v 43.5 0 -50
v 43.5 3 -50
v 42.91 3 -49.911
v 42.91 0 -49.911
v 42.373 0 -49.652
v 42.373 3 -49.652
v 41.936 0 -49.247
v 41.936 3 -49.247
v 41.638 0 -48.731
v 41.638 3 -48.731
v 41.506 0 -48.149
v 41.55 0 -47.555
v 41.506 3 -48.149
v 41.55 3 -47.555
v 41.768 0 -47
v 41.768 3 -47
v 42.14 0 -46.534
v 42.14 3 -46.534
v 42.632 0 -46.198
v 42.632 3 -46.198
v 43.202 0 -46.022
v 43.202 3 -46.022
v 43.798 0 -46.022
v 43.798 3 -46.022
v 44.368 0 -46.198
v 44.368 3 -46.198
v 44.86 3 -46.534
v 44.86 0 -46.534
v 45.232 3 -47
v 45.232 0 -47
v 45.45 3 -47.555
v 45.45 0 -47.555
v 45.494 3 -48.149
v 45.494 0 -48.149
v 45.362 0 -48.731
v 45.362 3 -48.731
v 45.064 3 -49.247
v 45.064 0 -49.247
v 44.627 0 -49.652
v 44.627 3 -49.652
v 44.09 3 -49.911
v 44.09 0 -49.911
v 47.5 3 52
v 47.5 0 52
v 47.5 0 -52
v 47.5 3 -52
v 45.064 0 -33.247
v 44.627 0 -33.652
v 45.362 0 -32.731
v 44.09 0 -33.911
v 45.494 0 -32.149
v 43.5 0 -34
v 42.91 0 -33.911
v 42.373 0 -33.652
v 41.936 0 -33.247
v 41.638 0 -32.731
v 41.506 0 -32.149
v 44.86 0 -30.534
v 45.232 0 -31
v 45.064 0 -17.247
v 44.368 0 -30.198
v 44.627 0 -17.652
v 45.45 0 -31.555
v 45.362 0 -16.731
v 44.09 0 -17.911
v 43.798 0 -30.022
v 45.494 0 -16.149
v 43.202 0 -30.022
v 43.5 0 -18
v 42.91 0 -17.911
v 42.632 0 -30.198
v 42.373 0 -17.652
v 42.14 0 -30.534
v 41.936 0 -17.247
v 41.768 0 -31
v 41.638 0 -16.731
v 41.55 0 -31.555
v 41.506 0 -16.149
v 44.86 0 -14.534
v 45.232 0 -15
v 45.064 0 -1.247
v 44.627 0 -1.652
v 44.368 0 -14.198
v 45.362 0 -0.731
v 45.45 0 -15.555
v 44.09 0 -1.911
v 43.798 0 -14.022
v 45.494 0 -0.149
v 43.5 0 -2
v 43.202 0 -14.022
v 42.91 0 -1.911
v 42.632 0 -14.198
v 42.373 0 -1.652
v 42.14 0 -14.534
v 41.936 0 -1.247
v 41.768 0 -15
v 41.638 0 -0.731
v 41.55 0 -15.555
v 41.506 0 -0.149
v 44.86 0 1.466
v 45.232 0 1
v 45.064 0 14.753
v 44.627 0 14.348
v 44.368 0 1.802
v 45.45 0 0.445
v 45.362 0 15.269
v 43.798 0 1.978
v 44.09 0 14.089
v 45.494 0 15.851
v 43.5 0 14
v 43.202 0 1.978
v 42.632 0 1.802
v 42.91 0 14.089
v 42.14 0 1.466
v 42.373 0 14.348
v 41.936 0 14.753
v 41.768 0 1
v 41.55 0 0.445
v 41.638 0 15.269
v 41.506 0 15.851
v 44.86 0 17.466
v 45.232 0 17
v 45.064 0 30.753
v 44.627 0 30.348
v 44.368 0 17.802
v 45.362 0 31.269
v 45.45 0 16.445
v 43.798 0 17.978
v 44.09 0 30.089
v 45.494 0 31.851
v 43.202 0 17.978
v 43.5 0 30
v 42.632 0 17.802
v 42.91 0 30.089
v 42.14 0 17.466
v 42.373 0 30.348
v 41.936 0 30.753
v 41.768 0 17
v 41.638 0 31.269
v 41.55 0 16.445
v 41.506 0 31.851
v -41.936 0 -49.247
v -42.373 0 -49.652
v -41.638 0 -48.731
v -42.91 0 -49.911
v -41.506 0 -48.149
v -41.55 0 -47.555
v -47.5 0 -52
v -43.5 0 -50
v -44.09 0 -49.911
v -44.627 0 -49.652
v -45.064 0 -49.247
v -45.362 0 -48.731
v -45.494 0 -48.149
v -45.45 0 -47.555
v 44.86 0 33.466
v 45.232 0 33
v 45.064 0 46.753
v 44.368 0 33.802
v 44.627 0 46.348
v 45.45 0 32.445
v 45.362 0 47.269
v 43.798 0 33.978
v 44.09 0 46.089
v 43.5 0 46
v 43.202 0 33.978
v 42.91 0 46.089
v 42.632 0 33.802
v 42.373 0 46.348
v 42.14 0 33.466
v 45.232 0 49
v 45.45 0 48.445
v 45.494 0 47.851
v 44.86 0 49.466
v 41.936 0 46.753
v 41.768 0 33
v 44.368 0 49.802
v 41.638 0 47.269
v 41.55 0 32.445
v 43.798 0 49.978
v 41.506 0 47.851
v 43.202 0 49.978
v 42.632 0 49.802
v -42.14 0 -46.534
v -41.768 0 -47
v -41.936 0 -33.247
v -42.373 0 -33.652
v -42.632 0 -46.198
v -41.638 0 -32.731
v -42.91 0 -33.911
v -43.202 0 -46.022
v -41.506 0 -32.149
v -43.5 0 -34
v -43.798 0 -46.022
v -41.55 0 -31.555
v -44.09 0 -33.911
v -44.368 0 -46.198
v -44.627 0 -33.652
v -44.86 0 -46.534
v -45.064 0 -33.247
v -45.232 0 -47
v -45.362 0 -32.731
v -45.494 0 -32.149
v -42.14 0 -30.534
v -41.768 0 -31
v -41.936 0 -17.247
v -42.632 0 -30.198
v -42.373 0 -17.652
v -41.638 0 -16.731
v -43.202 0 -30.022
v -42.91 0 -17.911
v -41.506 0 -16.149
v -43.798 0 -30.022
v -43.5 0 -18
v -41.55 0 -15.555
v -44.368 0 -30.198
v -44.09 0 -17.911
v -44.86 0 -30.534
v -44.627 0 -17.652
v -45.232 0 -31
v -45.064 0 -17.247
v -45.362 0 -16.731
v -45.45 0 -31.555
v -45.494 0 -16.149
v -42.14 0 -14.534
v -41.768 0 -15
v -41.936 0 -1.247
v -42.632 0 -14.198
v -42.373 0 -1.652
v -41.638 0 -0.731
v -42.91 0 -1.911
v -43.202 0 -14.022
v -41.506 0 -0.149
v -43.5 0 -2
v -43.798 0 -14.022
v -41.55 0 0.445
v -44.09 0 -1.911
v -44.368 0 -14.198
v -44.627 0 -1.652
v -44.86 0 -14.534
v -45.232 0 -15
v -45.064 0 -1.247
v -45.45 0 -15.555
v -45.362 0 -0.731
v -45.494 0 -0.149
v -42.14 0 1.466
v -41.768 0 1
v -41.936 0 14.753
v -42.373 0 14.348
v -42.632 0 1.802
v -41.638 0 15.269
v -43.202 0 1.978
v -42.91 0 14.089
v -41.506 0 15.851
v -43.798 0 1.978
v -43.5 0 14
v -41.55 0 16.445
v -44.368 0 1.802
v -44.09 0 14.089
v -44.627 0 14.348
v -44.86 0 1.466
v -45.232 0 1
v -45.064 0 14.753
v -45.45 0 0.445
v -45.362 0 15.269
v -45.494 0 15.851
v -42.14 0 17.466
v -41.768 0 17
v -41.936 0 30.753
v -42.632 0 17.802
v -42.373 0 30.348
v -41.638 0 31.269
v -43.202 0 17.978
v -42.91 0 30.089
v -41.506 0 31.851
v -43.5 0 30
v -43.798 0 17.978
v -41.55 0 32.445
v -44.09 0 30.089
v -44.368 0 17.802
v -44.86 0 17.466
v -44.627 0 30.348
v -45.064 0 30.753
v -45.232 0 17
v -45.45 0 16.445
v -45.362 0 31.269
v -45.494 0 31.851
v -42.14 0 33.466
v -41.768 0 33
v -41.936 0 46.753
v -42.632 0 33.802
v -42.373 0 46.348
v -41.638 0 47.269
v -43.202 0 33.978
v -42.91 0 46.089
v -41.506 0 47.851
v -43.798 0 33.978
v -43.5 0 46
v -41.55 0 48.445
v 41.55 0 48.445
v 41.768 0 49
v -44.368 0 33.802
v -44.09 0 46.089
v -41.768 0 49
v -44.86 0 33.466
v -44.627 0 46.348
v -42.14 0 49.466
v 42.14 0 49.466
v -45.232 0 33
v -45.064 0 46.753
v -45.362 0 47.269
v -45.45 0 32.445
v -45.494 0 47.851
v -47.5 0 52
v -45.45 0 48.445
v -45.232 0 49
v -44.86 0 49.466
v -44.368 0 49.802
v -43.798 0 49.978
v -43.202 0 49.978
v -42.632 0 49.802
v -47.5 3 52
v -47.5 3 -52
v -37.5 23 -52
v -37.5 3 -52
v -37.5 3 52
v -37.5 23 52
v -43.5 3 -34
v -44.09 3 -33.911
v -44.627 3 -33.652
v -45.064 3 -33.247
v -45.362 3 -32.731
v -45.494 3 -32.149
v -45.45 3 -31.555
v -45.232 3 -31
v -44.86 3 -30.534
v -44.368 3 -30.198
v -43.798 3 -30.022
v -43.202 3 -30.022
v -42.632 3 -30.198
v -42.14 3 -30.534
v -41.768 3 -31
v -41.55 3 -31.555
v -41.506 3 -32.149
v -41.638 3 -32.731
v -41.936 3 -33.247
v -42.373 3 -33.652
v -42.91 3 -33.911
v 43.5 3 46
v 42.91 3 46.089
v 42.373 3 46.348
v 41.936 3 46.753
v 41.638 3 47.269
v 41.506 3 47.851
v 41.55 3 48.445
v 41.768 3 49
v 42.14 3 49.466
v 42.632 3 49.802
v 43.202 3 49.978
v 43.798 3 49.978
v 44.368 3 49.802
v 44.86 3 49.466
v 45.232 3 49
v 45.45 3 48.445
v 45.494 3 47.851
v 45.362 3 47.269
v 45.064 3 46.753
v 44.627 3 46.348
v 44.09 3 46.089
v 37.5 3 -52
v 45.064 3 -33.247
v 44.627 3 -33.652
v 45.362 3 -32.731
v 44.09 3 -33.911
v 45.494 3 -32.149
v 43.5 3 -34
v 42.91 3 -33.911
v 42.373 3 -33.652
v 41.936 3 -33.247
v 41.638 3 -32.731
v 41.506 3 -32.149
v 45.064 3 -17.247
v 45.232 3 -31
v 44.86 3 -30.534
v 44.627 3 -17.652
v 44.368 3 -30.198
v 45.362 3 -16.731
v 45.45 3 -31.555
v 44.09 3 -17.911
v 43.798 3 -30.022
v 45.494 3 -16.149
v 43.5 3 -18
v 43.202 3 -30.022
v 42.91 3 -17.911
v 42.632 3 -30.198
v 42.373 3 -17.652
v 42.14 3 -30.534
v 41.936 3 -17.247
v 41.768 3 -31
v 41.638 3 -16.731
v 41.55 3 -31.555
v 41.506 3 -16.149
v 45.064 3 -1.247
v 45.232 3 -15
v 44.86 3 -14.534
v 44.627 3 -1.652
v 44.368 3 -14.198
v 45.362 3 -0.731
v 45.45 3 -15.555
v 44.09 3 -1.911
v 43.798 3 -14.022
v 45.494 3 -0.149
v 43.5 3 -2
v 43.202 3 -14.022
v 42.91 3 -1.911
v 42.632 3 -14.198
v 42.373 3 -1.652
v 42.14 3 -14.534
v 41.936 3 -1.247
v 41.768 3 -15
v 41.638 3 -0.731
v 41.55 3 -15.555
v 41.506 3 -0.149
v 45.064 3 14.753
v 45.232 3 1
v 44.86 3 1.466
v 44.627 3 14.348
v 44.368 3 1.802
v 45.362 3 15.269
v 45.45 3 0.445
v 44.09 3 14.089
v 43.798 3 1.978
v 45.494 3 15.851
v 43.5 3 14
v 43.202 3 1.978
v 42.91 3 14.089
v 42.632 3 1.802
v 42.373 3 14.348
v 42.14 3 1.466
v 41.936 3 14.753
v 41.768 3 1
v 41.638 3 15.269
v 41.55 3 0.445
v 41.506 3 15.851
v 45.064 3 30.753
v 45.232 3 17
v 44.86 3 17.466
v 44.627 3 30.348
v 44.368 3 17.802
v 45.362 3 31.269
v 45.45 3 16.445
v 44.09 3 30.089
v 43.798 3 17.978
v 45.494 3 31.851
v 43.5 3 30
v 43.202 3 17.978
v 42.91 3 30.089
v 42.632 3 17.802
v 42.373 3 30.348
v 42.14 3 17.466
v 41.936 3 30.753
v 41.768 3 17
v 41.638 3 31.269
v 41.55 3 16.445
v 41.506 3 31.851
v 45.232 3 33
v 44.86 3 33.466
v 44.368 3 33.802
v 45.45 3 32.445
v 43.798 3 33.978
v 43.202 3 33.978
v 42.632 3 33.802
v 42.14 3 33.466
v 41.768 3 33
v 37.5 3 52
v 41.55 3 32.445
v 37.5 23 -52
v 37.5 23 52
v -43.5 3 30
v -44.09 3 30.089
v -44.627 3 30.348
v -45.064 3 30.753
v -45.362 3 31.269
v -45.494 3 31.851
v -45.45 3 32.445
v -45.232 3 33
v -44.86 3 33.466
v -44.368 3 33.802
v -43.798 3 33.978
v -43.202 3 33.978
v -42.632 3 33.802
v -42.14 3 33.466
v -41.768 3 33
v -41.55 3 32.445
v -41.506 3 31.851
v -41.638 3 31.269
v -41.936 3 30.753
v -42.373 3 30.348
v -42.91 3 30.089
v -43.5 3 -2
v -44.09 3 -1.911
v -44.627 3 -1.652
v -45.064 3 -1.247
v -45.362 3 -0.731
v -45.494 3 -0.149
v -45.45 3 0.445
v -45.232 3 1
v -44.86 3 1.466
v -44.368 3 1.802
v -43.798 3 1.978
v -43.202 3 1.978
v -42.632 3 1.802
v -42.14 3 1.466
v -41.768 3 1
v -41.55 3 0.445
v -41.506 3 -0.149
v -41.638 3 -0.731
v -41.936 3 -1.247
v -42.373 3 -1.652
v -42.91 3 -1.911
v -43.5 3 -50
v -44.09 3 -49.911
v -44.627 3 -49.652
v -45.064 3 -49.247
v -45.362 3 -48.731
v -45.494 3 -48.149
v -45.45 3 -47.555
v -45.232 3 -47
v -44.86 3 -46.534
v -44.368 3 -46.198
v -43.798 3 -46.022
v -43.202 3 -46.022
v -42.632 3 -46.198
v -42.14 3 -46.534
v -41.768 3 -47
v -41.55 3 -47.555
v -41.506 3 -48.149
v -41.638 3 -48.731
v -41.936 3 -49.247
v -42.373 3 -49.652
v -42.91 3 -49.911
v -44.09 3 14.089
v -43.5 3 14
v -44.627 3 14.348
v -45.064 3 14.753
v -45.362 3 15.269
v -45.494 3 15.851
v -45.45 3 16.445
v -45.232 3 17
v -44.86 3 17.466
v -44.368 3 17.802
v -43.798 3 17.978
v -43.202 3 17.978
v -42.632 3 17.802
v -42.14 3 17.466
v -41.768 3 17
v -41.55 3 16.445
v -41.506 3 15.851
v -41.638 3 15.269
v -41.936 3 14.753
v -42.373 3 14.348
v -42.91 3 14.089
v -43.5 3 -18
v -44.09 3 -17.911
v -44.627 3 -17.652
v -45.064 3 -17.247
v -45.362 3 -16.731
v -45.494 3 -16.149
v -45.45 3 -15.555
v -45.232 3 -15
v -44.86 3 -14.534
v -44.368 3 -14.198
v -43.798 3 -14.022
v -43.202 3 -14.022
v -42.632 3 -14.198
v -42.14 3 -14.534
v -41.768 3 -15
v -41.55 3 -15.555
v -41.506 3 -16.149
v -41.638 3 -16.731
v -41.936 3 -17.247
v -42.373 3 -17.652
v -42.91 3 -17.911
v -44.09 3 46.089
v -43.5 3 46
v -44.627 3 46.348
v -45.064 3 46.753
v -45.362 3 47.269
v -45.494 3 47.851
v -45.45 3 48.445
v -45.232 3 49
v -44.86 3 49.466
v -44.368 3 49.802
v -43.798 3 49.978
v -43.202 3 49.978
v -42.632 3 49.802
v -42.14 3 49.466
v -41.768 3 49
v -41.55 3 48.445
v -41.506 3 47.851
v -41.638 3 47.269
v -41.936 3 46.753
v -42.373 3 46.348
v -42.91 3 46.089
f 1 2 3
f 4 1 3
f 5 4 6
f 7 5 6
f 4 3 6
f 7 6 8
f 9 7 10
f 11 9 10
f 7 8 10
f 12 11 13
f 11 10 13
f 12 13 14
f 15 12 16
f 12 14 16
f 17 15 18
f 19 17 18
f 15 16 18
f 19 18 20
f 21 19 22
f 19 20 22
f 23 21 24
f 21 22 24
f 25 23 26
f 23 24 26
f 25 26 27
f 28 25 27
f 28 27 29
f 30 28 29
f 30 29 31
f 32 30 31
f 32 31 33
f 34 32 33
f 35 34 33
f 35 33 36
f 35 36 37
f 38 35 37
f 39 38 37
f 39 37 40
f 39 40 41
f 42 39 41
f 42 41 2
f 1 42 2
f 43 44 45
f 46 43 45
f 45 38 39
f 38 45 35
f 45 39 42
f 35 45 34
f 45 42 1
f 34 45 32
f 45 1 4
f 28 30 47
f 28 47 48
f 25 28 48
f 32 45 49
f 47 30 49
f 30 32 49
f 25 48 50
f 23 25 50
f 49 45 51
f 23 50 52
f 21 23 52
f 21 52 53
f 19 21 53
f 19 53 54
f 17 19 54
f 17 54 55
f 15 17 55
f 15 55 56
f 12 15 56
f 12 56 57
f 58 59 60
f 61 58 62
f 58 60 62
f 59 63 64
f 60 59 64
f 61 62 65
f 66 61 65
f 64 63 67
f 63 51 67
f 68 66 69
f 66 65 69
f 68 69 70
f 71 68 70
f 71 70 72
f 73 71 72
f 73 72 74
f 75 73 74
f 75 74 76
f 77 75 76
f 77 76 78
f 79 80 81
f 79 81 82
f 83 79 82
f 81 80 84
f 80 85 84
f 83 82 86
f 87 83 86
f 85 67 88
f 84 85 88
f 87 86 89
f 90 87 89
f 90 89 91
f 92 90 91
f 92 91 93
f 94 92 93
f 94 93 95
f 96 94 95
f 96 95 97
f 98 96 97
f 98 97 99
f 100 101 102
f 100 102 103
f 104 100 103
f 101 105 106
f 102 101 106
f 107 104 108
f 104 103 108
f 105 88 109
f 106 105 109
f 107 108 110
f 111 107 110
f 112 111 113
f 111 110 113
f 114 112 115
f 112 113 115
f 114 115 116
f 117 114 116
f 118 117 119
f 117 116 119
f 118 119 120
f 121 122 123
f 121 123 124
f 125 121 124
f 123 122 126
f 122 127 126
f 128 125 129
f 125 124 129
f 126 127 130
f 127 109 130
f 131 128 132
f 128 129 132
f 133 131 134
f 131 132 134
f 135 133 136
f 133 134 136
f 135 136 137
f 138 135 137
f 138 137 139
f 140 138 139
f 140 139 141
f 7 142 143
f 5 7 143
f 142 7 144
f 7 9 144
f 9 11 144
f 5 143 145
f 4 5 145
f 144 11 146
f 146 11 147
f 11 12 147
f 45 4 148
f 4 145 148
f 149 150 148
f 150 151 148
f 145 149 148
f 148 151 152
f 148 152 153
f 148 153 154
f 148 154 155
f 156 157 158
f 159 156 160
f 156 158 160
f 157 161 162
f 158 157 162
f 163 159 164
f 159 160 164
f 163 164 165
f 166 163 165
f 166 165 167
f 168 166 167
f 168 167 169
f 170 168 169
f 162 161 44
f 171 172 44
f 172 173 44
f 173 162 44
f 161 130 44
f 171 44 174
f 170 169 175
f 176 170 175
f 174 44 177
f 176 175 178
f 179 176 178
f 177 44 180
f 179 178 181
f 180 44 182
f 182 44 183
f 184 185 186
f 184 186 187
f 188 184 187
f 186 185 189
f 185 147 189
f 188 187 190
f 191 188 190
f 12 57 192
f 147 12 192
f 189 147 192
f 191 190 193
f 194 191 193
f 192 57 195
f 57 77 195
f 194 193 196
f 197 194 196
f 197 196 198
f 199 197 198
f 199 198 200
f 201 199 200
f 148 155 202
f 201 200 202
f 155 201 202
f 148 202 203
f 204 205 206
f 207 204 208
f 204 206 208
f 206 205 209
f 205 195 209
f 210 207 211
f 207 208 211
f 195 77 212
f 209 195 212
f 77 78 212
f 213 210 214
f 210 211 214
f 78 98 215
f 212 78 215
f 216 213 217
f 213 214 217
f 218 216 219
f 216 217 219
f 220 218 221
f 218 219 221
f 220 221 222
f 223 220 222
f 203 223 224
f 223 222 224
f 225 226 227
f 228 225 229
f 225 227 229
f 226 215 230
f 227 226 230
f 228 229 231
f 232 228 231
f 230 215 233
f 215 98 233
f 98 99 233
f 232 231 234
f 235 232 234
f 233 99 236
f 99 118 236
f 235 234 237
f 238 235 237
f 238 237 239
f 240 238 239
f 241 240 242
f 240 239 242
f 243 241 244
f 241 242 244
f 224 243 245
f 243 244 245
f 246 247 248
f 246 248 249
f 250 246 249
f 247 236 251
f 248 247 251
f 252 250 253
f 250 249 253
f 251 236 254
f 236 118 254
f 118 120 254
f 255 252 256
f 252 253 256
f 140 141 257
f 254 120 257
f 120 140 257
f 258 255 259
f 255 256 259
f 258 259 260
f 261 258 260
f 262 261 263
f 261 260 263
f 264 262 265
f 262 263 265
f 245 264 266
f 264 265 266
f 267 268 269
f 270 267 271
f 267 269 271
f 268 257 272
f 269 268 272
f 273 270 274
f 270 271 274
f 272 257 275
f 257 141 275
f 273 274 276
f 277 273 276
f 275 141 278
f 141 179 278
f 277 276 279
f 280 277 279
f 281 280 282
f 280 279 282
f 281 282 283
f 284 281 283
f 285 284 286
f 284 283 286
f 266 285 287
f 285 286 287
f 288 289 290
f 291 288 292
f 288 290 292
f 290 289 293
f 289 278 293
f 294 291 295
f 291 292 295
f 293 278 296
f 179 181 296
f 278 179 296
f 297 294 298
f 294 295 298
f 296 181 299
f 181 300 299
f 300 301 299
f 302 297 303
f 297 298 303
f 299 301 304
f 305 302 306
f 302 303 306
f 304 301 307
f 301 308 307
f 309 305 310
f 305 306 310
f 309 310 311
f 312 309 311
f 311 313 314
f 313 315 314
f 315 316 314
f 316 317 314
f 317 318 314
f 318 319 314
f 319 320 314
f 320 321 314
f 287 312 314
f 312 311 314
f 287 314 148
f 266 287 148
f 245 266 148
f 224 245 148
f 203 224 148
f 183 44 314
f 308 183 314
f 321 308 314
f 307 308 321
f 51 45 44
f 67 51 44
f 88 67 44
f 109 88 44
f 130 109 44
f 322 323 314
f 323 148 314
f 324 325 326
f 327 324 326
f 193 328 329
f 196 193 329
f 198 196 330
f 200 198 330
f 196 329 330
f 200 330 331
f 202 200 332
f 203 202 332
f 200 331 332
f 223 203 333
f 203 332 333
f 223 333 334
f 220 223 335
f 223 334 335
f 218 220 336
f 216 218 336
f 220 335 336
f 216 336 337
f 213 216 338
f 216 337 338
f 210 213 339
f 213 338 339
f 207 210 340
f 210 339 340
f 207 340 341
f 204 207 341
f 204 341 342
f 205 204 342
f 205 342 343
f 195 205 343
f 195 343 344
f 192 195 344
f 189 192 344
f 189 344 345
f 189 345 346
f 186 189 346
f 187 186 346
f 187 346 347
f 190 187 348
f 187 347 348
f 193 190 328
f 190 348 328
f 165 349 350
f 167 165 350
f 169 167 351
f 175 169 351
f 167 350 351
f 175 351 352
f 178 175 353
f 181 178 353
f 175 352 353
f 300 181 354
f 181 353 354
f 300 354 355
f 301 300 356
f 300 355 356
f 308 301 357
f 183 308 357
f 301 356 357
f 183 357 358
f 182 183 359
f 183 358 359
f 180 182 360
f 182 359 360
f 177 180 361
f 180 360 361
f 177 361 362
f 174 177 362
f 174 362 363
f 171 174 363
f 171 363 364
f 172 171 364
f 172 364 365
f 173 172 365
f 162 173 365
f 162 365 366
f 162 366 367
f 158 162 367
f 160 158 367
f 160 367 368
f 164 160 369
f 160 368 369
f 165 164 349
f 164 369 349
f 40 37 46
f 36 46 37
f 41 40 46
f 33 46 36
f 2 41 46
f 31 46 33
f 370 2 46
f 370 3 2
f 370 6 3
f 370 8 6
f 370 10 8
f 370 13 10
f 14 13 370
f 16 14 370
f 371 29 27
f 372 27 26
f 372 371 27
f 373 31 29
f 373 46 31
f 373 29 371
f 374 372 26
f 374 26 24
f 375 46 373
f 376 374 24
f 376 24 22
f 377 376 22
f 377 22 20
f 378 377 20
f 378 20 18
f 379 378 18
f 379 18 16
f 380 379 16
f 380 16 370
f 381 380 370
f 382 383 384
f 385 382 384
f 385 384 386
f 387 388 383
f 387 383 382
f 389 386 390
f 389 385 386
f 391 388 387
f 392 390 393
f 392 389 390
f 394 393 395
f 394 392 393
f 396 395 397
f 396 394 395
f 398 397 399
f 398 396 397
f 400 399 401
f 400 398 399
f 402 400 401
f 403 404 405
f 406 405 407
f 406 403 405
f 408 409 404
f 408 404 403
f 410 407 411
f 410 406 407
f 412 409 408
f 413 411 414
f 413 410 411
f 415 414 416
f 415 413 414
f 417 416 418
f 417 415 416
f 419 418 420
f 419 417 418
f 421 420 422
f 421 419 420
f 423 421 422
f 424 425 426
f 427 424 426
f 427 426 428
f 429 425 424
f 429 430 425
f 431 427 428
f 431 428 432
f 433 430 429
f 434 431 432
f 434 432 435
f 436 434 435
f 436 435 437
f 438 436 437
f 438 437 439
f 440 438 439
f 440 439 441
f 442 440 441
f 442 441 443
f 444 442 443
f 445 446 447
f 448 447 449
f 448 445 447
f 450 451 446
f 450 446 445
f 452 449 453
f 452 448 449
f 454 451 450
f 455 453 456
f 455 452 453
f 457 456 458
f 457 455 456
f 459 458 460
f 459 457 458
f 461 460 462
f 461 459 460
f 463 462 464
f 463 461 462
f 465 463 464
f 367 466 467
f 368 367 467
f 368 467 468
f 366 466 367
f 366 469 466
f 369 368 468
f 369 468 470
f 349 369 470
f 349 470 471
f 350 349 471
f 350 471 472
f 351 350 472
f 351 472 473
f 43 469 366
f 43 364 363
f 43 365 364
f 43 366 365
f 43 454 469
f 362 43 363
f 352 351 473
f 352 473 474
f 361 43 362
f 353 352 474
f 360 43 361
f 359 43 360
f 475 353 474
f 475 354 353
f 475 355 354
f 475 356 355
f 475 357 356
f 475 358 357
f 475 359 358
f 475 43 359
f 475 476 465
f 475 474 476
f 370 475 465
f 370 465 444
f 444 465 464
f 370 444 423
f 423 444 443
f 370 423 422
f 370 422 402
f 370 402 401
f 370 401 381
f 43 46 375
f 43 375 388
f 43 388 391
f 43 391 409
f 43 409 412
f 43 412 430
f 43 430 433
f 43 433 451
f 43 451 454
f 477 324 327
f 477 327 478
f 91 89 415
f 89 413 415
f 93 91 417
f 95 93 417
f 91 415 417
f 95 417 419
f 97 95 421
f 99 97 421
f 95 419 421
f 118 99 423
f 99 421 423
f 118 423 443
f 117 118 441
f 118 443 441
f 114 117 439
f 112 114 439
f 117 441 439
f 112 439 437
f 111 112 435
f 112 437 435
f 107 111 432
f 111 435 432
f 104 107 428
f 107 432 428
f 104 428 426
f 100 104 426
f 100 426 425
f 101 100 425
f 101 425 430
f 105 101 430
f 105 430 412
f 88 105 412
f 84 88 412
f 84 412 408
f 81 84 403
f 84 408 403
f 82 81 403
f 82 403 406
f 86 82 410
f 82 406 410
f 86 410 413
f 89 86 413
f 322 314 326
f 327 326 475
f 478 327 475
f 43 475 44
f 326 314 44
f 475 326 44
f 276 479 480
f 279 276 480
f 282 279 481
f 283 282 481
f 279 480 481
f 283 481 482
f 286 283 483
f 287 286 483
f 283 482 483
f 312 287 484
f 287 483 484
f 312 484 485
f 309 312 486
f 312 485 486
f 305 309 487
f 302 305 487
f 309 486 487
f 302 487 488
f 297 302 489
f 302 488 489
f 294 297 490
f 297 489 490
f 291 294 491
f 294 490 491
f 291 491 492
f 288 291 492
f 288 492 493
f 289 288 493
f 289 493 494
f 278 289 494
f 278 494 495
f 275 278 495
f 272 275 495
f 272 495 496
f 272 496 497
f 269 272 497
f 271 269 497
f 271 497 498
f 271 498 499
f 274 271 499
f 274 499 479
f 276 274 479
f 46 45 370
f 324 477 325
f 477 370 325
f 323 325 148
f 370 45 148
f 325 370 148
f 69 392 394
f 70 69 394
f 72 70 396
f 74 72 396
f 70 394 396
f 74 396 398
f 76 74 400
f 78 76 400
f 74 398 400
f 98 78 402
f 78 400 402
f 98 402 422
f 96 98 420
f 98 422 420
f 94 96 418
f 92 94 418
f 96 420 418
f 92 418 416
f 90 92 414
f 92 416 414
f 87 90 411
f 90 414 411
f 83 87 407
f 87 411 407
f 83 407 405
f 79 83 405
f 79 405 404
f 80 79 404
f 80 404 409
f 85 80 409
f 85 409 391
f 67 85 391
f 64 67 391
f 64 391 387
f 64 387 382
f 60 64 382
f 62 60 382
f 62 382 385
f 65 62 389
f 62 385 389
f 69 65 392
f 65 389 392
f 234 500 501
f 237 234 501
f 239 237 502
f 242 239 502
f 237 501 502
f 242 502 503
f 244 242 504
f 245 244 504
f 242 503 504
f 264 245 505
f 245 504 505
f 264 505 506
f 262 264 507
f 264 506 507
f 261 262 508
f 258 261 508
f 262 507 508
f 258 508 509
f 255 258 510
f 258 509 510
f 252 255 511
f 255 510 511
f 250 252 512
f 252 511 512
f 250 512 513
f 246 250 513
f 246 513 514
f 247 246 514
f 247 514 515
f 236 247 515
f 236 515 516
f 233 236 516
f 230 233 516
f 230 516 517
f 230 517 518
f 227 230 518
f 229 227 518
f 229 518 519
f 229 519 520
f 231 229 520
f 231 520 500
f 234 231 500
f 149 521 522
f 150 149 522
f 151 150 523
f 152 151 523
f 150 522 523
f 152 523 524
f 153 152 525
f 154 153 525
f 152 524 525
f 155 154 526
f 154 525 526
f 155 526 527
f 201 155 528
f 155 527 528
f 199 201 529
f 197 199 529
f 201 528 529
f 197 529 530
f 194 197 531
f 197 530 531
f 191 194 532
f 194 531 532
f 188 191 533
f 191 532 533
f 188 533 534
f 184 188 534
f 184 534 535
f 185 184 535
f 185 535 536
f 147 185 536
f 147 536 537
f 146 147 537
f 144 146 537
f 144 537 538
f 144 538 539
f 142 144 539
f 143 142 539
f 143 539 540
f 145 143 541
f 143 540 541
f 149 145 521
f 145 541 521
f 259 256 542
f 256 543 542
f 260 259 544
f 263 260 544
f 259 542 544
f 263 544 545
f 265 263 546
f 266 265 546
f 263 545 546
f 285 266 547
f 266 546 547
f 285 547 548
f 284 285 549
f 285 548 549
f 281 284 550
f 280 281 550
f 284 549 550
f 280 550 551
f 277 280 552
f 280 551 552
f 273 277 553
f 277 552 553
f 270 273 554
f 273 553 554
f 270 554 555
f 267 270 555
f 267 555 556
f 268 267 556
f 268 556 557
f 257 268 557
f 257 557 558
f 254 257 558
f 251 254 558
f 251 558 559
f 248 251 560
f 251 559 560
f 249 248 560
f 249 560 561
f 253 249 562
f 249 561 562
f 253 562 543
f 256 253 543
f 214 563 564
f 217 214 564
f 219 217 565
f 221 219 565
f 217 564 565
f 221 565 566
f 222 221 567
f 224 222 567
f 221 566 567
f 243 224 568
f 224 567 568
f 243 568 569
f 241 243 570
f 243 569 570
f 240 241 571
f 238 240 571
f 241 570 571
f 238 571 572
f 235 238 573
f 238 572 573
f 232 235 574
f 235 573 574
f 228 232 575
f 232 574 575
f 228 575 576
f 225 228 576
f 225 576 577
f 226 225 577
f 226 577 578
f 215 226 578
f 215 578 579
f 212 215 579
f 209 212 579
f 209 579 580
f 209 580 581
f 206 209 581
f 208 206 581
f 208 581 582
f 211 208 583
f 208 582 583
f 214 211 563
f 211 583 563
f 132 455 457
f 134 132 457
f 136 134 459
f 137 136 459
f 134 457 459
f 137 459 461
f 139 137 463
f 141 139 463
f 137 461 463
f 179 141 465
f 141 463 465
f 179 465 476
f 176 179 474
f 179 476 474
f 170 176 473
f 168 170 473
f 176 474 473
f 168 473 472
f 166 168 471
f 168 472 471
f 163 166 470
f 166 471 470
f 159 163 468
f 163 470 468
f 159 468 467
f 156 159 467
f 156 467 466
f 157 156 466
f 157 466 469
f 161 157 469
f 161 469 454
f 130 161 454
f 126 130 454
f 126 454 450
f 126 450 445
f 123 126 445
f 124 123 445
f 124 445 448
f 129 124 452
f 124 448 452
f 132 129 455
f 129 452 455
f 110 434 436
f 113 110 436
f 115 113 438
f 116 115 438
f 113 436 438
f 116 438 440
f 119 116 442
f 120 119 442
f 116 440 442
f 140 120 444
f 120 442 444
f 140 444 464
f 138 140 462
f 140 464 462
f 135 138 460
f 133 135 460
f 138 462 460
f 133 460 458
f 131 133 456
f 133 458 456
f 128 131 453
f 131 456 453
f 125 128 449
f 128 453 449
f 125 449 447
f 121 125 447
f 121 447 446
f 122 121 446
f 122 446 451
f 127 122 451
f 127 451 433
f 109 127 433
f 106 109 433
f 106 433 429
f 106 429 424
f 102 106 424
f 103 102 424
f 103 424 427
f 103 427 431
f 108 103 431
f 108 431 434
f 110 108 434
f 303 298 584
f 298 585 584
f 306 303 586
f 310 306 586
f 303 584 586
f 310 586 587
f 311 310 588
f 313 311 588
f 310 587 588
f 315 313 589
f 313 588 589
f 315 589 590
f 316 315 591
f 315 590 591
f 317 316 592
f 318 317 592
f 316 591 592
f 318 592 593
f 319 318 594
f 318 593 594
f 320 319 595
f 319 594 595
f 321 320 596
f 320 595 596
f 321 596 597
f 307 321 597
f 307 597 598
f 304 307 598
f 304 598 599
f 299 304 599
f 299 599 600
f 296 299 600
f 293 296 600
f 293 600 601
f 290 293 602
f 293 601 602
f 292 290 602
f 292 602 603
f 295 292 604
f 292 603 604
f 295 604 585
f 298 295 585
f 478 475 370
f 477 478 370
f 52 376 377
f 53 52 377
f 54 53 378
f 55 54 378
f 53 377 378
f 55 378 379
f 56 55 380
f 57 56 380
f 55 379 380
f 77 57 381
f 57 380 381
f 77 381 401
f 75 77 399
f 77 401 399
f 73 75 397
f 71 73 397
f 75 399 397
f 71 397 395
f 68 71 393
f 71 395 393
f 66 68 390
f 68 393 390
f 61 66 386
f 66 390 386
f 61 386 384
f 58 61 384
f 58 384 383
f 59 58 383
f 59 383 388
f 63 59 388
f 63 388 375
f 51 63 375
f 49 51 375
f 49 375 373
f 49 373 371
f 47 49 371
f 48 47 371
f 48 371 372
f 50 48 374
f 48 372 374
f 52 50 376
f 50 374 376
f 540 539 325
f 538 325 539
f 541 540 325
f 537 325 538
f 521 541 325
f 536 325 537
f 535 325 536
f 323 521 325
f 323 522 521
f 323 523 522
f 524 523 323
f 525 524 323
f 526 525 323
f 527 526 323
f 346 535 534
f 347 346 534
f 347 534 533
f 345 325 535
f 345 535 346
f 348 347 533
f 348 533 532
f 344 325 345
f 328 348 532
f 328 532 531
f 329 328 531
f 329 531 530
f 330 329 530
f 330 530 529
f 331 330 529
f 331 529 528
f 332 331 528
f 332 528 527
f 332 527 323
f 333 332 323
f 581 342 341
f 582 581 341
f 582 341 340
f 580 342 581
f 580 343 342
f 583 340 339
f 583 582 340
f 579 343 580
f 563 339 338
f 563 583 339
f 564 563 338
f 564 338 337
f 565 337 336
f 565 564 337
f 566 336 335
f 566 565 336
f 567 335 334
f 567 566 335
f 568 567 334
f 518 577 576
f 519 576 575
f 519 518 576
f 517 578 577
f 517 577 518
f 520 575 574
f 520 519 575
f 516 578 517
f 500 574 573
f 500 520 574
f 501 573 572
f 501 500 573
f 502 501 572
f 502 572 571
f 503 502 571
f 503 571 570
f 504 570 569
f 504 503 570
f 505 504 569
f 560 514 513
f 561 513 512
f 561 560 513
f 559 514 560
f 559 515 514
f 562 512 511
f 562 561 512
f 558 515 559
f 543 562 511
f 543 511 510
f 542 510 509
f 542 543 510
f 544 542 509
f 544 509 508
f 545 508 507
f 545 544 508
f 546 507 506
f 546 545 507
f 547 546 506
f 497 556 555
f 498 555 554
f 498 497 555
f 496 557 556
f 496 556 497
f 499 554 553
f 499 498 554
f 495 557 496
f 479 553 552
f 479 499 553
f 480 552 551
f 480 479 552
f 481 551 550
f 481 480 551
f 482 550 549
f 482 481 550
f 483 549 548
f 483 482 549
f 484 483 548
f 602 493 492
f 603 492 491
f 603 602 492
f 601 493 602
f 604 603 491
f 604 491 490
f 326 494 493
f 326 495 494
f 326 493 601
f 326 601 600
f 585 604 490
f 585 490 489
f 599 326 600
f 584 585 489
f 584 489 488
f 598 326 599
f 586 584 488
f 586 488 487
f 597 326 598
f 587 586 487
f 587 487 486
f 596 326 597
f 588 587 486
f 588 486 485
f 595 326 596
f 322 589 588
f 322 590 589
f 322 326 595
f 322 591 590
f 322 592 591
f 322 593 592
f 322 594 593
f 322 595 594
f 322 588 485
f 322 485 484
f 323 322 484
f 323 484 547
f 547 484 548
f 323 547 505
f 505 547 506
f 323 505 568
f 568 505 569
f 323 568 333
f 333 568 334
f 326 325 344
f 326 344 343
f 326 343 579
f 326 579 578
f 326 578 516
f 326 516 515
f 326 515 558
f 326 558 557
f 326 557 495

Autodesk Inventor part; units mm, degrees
ref_plane "YZ Plane" through (0, 0, 0) normal (1, 0, 0) x (0, 1, 0)
ref_plane "XZ Plane" through (0, 0, 0) normal (0, 1, 0) x (-1, 0, 0)
ref_plane "XY Plane" through (0, 0, 0) normal (0, 0, 1) x (1, 0, 0)
sketch "Sketch1" plane through (0, 0, 0) normal (0, 1, 0) x (-1, 0, 0)
  line L0 (-47.5, -52) -> (47.5, -52)
  line L1 (47.5, -52) -> (47.5, 52)
  line L2 (47.5, 52) -> (-47.5, 52)
  line L3 (-47.5, 52) -> (-47.5, -52)
  line L4 (-47.5, -52) -> (47.5, 52) construction
  line L5 (47.5, -52) -> (-47.5, 52) construction
  point P0 (0, 0)
  dimension "d0" = 95
  dimension "d1" = 104
extrude "Extrusion1" add sketch "Sketch1" along normal blind 3
sketch "Sketch2" plane through (0, 3, 0) normal (0, 1, 0) x (1, 0, 0)
  line L0 (-47.5, -52) -> (47.5, -52) projected
  line L1 (37.5, 52) -> (-37.5, 52)
  line L2 (-37.5, 52) -> (-37.5, -52)
  line L3 (-37.5, -52) -> (37.5, -52)
  line L4 (37.5, -52) -> (37.5, 52)
  line L5 (37.5, 52) -> (-37.5, -52) construction
  line L6 (-37.5, 52) -> (37.5, -52) construction
  point P0 (0, 0)
  dimension "d4" = 75
  dimension "d5" = 104
extrude "Extrusion2" add sketch "Sketch2" along normal blind 20
sketch "Sketch3" plane through (0, 0, 0) normal (0, -1, 0) x (1, 0, 0)
  line L0 (-47.5, 52) -> (-43.5, 52)
  line L1 (-43.5, 52) -> (-43.5, 48)
  line L2 (-43.5, 48) -> (-47.5, 48)
  line L3 (-47.5, 48) -> (-47.5, 52)
  line L4 (-47.5, 52) -> (47.5, 52) projected
  line L5 (47.5, 52) -> (43.5, 52)
  line L6 (43.5, 52) -> (43.5, 48)
  line L7 (43.5, 48) -> (47.5, 48)
  line L8 (47.5, 48) -> (47.5, 52)
  circle A0 centre (-43.5, 48) radius 1.85 projected
  circle A1 centre (-43.5, 32) radius 1.85 projected
  circle A2 centre (-43.5, 16) radius 1.85 projected
  circle A3 centre (-43.5, 0) radius 1.85 projected
  circle A4 centre (-43.5, -16) radius 1.85 projected
  circle A5 centre (-43.5, -32) radius 1.85 projected
  circle A6 centre (-43.5, -48) radius 1.85 projected
  circle A7 centre (43.5, -48) radius 1.85 projected
  circle A8 centre (43.5, -32) radius 1.85 projected
  circle A9 centre (43.5, -16) radius 1.85 projected
  circle A10 centre (43.5, 0) radius 1.85 projected
  circle A11 centre (43.5, 16) radius 1.85 projected
  circle A12 centre (43.5, 32) radius 1.85 projected
  circle A13 centre (43.5, 48) radius 1.85 projected
  point P0 (0, 0)
  dimension "d8" = 4
  dimension "d9" = 4
  dimension "d10" = 4
  dimension "d11" = 4
hole "Hole2" at (-43.5, 0, 48) at (-43.5, 0, 32) at (-43.5, 0, 16) at (-43.5, 0, 0) at (-43.5, 0, -16) at (-43.5, 0, -32) at (-43.5, 0, -48) at (43.5, 0, -48) at (43.5, 0, -32) at (43.5, 0, -16) at (43.5, 0, 0) at (43.5, 0, 16) at (43.5, 0, 32) at (43.5, 0, 48) direction (0, 1, 0) diameter 4 end through all
properties part number "CPD Module"
